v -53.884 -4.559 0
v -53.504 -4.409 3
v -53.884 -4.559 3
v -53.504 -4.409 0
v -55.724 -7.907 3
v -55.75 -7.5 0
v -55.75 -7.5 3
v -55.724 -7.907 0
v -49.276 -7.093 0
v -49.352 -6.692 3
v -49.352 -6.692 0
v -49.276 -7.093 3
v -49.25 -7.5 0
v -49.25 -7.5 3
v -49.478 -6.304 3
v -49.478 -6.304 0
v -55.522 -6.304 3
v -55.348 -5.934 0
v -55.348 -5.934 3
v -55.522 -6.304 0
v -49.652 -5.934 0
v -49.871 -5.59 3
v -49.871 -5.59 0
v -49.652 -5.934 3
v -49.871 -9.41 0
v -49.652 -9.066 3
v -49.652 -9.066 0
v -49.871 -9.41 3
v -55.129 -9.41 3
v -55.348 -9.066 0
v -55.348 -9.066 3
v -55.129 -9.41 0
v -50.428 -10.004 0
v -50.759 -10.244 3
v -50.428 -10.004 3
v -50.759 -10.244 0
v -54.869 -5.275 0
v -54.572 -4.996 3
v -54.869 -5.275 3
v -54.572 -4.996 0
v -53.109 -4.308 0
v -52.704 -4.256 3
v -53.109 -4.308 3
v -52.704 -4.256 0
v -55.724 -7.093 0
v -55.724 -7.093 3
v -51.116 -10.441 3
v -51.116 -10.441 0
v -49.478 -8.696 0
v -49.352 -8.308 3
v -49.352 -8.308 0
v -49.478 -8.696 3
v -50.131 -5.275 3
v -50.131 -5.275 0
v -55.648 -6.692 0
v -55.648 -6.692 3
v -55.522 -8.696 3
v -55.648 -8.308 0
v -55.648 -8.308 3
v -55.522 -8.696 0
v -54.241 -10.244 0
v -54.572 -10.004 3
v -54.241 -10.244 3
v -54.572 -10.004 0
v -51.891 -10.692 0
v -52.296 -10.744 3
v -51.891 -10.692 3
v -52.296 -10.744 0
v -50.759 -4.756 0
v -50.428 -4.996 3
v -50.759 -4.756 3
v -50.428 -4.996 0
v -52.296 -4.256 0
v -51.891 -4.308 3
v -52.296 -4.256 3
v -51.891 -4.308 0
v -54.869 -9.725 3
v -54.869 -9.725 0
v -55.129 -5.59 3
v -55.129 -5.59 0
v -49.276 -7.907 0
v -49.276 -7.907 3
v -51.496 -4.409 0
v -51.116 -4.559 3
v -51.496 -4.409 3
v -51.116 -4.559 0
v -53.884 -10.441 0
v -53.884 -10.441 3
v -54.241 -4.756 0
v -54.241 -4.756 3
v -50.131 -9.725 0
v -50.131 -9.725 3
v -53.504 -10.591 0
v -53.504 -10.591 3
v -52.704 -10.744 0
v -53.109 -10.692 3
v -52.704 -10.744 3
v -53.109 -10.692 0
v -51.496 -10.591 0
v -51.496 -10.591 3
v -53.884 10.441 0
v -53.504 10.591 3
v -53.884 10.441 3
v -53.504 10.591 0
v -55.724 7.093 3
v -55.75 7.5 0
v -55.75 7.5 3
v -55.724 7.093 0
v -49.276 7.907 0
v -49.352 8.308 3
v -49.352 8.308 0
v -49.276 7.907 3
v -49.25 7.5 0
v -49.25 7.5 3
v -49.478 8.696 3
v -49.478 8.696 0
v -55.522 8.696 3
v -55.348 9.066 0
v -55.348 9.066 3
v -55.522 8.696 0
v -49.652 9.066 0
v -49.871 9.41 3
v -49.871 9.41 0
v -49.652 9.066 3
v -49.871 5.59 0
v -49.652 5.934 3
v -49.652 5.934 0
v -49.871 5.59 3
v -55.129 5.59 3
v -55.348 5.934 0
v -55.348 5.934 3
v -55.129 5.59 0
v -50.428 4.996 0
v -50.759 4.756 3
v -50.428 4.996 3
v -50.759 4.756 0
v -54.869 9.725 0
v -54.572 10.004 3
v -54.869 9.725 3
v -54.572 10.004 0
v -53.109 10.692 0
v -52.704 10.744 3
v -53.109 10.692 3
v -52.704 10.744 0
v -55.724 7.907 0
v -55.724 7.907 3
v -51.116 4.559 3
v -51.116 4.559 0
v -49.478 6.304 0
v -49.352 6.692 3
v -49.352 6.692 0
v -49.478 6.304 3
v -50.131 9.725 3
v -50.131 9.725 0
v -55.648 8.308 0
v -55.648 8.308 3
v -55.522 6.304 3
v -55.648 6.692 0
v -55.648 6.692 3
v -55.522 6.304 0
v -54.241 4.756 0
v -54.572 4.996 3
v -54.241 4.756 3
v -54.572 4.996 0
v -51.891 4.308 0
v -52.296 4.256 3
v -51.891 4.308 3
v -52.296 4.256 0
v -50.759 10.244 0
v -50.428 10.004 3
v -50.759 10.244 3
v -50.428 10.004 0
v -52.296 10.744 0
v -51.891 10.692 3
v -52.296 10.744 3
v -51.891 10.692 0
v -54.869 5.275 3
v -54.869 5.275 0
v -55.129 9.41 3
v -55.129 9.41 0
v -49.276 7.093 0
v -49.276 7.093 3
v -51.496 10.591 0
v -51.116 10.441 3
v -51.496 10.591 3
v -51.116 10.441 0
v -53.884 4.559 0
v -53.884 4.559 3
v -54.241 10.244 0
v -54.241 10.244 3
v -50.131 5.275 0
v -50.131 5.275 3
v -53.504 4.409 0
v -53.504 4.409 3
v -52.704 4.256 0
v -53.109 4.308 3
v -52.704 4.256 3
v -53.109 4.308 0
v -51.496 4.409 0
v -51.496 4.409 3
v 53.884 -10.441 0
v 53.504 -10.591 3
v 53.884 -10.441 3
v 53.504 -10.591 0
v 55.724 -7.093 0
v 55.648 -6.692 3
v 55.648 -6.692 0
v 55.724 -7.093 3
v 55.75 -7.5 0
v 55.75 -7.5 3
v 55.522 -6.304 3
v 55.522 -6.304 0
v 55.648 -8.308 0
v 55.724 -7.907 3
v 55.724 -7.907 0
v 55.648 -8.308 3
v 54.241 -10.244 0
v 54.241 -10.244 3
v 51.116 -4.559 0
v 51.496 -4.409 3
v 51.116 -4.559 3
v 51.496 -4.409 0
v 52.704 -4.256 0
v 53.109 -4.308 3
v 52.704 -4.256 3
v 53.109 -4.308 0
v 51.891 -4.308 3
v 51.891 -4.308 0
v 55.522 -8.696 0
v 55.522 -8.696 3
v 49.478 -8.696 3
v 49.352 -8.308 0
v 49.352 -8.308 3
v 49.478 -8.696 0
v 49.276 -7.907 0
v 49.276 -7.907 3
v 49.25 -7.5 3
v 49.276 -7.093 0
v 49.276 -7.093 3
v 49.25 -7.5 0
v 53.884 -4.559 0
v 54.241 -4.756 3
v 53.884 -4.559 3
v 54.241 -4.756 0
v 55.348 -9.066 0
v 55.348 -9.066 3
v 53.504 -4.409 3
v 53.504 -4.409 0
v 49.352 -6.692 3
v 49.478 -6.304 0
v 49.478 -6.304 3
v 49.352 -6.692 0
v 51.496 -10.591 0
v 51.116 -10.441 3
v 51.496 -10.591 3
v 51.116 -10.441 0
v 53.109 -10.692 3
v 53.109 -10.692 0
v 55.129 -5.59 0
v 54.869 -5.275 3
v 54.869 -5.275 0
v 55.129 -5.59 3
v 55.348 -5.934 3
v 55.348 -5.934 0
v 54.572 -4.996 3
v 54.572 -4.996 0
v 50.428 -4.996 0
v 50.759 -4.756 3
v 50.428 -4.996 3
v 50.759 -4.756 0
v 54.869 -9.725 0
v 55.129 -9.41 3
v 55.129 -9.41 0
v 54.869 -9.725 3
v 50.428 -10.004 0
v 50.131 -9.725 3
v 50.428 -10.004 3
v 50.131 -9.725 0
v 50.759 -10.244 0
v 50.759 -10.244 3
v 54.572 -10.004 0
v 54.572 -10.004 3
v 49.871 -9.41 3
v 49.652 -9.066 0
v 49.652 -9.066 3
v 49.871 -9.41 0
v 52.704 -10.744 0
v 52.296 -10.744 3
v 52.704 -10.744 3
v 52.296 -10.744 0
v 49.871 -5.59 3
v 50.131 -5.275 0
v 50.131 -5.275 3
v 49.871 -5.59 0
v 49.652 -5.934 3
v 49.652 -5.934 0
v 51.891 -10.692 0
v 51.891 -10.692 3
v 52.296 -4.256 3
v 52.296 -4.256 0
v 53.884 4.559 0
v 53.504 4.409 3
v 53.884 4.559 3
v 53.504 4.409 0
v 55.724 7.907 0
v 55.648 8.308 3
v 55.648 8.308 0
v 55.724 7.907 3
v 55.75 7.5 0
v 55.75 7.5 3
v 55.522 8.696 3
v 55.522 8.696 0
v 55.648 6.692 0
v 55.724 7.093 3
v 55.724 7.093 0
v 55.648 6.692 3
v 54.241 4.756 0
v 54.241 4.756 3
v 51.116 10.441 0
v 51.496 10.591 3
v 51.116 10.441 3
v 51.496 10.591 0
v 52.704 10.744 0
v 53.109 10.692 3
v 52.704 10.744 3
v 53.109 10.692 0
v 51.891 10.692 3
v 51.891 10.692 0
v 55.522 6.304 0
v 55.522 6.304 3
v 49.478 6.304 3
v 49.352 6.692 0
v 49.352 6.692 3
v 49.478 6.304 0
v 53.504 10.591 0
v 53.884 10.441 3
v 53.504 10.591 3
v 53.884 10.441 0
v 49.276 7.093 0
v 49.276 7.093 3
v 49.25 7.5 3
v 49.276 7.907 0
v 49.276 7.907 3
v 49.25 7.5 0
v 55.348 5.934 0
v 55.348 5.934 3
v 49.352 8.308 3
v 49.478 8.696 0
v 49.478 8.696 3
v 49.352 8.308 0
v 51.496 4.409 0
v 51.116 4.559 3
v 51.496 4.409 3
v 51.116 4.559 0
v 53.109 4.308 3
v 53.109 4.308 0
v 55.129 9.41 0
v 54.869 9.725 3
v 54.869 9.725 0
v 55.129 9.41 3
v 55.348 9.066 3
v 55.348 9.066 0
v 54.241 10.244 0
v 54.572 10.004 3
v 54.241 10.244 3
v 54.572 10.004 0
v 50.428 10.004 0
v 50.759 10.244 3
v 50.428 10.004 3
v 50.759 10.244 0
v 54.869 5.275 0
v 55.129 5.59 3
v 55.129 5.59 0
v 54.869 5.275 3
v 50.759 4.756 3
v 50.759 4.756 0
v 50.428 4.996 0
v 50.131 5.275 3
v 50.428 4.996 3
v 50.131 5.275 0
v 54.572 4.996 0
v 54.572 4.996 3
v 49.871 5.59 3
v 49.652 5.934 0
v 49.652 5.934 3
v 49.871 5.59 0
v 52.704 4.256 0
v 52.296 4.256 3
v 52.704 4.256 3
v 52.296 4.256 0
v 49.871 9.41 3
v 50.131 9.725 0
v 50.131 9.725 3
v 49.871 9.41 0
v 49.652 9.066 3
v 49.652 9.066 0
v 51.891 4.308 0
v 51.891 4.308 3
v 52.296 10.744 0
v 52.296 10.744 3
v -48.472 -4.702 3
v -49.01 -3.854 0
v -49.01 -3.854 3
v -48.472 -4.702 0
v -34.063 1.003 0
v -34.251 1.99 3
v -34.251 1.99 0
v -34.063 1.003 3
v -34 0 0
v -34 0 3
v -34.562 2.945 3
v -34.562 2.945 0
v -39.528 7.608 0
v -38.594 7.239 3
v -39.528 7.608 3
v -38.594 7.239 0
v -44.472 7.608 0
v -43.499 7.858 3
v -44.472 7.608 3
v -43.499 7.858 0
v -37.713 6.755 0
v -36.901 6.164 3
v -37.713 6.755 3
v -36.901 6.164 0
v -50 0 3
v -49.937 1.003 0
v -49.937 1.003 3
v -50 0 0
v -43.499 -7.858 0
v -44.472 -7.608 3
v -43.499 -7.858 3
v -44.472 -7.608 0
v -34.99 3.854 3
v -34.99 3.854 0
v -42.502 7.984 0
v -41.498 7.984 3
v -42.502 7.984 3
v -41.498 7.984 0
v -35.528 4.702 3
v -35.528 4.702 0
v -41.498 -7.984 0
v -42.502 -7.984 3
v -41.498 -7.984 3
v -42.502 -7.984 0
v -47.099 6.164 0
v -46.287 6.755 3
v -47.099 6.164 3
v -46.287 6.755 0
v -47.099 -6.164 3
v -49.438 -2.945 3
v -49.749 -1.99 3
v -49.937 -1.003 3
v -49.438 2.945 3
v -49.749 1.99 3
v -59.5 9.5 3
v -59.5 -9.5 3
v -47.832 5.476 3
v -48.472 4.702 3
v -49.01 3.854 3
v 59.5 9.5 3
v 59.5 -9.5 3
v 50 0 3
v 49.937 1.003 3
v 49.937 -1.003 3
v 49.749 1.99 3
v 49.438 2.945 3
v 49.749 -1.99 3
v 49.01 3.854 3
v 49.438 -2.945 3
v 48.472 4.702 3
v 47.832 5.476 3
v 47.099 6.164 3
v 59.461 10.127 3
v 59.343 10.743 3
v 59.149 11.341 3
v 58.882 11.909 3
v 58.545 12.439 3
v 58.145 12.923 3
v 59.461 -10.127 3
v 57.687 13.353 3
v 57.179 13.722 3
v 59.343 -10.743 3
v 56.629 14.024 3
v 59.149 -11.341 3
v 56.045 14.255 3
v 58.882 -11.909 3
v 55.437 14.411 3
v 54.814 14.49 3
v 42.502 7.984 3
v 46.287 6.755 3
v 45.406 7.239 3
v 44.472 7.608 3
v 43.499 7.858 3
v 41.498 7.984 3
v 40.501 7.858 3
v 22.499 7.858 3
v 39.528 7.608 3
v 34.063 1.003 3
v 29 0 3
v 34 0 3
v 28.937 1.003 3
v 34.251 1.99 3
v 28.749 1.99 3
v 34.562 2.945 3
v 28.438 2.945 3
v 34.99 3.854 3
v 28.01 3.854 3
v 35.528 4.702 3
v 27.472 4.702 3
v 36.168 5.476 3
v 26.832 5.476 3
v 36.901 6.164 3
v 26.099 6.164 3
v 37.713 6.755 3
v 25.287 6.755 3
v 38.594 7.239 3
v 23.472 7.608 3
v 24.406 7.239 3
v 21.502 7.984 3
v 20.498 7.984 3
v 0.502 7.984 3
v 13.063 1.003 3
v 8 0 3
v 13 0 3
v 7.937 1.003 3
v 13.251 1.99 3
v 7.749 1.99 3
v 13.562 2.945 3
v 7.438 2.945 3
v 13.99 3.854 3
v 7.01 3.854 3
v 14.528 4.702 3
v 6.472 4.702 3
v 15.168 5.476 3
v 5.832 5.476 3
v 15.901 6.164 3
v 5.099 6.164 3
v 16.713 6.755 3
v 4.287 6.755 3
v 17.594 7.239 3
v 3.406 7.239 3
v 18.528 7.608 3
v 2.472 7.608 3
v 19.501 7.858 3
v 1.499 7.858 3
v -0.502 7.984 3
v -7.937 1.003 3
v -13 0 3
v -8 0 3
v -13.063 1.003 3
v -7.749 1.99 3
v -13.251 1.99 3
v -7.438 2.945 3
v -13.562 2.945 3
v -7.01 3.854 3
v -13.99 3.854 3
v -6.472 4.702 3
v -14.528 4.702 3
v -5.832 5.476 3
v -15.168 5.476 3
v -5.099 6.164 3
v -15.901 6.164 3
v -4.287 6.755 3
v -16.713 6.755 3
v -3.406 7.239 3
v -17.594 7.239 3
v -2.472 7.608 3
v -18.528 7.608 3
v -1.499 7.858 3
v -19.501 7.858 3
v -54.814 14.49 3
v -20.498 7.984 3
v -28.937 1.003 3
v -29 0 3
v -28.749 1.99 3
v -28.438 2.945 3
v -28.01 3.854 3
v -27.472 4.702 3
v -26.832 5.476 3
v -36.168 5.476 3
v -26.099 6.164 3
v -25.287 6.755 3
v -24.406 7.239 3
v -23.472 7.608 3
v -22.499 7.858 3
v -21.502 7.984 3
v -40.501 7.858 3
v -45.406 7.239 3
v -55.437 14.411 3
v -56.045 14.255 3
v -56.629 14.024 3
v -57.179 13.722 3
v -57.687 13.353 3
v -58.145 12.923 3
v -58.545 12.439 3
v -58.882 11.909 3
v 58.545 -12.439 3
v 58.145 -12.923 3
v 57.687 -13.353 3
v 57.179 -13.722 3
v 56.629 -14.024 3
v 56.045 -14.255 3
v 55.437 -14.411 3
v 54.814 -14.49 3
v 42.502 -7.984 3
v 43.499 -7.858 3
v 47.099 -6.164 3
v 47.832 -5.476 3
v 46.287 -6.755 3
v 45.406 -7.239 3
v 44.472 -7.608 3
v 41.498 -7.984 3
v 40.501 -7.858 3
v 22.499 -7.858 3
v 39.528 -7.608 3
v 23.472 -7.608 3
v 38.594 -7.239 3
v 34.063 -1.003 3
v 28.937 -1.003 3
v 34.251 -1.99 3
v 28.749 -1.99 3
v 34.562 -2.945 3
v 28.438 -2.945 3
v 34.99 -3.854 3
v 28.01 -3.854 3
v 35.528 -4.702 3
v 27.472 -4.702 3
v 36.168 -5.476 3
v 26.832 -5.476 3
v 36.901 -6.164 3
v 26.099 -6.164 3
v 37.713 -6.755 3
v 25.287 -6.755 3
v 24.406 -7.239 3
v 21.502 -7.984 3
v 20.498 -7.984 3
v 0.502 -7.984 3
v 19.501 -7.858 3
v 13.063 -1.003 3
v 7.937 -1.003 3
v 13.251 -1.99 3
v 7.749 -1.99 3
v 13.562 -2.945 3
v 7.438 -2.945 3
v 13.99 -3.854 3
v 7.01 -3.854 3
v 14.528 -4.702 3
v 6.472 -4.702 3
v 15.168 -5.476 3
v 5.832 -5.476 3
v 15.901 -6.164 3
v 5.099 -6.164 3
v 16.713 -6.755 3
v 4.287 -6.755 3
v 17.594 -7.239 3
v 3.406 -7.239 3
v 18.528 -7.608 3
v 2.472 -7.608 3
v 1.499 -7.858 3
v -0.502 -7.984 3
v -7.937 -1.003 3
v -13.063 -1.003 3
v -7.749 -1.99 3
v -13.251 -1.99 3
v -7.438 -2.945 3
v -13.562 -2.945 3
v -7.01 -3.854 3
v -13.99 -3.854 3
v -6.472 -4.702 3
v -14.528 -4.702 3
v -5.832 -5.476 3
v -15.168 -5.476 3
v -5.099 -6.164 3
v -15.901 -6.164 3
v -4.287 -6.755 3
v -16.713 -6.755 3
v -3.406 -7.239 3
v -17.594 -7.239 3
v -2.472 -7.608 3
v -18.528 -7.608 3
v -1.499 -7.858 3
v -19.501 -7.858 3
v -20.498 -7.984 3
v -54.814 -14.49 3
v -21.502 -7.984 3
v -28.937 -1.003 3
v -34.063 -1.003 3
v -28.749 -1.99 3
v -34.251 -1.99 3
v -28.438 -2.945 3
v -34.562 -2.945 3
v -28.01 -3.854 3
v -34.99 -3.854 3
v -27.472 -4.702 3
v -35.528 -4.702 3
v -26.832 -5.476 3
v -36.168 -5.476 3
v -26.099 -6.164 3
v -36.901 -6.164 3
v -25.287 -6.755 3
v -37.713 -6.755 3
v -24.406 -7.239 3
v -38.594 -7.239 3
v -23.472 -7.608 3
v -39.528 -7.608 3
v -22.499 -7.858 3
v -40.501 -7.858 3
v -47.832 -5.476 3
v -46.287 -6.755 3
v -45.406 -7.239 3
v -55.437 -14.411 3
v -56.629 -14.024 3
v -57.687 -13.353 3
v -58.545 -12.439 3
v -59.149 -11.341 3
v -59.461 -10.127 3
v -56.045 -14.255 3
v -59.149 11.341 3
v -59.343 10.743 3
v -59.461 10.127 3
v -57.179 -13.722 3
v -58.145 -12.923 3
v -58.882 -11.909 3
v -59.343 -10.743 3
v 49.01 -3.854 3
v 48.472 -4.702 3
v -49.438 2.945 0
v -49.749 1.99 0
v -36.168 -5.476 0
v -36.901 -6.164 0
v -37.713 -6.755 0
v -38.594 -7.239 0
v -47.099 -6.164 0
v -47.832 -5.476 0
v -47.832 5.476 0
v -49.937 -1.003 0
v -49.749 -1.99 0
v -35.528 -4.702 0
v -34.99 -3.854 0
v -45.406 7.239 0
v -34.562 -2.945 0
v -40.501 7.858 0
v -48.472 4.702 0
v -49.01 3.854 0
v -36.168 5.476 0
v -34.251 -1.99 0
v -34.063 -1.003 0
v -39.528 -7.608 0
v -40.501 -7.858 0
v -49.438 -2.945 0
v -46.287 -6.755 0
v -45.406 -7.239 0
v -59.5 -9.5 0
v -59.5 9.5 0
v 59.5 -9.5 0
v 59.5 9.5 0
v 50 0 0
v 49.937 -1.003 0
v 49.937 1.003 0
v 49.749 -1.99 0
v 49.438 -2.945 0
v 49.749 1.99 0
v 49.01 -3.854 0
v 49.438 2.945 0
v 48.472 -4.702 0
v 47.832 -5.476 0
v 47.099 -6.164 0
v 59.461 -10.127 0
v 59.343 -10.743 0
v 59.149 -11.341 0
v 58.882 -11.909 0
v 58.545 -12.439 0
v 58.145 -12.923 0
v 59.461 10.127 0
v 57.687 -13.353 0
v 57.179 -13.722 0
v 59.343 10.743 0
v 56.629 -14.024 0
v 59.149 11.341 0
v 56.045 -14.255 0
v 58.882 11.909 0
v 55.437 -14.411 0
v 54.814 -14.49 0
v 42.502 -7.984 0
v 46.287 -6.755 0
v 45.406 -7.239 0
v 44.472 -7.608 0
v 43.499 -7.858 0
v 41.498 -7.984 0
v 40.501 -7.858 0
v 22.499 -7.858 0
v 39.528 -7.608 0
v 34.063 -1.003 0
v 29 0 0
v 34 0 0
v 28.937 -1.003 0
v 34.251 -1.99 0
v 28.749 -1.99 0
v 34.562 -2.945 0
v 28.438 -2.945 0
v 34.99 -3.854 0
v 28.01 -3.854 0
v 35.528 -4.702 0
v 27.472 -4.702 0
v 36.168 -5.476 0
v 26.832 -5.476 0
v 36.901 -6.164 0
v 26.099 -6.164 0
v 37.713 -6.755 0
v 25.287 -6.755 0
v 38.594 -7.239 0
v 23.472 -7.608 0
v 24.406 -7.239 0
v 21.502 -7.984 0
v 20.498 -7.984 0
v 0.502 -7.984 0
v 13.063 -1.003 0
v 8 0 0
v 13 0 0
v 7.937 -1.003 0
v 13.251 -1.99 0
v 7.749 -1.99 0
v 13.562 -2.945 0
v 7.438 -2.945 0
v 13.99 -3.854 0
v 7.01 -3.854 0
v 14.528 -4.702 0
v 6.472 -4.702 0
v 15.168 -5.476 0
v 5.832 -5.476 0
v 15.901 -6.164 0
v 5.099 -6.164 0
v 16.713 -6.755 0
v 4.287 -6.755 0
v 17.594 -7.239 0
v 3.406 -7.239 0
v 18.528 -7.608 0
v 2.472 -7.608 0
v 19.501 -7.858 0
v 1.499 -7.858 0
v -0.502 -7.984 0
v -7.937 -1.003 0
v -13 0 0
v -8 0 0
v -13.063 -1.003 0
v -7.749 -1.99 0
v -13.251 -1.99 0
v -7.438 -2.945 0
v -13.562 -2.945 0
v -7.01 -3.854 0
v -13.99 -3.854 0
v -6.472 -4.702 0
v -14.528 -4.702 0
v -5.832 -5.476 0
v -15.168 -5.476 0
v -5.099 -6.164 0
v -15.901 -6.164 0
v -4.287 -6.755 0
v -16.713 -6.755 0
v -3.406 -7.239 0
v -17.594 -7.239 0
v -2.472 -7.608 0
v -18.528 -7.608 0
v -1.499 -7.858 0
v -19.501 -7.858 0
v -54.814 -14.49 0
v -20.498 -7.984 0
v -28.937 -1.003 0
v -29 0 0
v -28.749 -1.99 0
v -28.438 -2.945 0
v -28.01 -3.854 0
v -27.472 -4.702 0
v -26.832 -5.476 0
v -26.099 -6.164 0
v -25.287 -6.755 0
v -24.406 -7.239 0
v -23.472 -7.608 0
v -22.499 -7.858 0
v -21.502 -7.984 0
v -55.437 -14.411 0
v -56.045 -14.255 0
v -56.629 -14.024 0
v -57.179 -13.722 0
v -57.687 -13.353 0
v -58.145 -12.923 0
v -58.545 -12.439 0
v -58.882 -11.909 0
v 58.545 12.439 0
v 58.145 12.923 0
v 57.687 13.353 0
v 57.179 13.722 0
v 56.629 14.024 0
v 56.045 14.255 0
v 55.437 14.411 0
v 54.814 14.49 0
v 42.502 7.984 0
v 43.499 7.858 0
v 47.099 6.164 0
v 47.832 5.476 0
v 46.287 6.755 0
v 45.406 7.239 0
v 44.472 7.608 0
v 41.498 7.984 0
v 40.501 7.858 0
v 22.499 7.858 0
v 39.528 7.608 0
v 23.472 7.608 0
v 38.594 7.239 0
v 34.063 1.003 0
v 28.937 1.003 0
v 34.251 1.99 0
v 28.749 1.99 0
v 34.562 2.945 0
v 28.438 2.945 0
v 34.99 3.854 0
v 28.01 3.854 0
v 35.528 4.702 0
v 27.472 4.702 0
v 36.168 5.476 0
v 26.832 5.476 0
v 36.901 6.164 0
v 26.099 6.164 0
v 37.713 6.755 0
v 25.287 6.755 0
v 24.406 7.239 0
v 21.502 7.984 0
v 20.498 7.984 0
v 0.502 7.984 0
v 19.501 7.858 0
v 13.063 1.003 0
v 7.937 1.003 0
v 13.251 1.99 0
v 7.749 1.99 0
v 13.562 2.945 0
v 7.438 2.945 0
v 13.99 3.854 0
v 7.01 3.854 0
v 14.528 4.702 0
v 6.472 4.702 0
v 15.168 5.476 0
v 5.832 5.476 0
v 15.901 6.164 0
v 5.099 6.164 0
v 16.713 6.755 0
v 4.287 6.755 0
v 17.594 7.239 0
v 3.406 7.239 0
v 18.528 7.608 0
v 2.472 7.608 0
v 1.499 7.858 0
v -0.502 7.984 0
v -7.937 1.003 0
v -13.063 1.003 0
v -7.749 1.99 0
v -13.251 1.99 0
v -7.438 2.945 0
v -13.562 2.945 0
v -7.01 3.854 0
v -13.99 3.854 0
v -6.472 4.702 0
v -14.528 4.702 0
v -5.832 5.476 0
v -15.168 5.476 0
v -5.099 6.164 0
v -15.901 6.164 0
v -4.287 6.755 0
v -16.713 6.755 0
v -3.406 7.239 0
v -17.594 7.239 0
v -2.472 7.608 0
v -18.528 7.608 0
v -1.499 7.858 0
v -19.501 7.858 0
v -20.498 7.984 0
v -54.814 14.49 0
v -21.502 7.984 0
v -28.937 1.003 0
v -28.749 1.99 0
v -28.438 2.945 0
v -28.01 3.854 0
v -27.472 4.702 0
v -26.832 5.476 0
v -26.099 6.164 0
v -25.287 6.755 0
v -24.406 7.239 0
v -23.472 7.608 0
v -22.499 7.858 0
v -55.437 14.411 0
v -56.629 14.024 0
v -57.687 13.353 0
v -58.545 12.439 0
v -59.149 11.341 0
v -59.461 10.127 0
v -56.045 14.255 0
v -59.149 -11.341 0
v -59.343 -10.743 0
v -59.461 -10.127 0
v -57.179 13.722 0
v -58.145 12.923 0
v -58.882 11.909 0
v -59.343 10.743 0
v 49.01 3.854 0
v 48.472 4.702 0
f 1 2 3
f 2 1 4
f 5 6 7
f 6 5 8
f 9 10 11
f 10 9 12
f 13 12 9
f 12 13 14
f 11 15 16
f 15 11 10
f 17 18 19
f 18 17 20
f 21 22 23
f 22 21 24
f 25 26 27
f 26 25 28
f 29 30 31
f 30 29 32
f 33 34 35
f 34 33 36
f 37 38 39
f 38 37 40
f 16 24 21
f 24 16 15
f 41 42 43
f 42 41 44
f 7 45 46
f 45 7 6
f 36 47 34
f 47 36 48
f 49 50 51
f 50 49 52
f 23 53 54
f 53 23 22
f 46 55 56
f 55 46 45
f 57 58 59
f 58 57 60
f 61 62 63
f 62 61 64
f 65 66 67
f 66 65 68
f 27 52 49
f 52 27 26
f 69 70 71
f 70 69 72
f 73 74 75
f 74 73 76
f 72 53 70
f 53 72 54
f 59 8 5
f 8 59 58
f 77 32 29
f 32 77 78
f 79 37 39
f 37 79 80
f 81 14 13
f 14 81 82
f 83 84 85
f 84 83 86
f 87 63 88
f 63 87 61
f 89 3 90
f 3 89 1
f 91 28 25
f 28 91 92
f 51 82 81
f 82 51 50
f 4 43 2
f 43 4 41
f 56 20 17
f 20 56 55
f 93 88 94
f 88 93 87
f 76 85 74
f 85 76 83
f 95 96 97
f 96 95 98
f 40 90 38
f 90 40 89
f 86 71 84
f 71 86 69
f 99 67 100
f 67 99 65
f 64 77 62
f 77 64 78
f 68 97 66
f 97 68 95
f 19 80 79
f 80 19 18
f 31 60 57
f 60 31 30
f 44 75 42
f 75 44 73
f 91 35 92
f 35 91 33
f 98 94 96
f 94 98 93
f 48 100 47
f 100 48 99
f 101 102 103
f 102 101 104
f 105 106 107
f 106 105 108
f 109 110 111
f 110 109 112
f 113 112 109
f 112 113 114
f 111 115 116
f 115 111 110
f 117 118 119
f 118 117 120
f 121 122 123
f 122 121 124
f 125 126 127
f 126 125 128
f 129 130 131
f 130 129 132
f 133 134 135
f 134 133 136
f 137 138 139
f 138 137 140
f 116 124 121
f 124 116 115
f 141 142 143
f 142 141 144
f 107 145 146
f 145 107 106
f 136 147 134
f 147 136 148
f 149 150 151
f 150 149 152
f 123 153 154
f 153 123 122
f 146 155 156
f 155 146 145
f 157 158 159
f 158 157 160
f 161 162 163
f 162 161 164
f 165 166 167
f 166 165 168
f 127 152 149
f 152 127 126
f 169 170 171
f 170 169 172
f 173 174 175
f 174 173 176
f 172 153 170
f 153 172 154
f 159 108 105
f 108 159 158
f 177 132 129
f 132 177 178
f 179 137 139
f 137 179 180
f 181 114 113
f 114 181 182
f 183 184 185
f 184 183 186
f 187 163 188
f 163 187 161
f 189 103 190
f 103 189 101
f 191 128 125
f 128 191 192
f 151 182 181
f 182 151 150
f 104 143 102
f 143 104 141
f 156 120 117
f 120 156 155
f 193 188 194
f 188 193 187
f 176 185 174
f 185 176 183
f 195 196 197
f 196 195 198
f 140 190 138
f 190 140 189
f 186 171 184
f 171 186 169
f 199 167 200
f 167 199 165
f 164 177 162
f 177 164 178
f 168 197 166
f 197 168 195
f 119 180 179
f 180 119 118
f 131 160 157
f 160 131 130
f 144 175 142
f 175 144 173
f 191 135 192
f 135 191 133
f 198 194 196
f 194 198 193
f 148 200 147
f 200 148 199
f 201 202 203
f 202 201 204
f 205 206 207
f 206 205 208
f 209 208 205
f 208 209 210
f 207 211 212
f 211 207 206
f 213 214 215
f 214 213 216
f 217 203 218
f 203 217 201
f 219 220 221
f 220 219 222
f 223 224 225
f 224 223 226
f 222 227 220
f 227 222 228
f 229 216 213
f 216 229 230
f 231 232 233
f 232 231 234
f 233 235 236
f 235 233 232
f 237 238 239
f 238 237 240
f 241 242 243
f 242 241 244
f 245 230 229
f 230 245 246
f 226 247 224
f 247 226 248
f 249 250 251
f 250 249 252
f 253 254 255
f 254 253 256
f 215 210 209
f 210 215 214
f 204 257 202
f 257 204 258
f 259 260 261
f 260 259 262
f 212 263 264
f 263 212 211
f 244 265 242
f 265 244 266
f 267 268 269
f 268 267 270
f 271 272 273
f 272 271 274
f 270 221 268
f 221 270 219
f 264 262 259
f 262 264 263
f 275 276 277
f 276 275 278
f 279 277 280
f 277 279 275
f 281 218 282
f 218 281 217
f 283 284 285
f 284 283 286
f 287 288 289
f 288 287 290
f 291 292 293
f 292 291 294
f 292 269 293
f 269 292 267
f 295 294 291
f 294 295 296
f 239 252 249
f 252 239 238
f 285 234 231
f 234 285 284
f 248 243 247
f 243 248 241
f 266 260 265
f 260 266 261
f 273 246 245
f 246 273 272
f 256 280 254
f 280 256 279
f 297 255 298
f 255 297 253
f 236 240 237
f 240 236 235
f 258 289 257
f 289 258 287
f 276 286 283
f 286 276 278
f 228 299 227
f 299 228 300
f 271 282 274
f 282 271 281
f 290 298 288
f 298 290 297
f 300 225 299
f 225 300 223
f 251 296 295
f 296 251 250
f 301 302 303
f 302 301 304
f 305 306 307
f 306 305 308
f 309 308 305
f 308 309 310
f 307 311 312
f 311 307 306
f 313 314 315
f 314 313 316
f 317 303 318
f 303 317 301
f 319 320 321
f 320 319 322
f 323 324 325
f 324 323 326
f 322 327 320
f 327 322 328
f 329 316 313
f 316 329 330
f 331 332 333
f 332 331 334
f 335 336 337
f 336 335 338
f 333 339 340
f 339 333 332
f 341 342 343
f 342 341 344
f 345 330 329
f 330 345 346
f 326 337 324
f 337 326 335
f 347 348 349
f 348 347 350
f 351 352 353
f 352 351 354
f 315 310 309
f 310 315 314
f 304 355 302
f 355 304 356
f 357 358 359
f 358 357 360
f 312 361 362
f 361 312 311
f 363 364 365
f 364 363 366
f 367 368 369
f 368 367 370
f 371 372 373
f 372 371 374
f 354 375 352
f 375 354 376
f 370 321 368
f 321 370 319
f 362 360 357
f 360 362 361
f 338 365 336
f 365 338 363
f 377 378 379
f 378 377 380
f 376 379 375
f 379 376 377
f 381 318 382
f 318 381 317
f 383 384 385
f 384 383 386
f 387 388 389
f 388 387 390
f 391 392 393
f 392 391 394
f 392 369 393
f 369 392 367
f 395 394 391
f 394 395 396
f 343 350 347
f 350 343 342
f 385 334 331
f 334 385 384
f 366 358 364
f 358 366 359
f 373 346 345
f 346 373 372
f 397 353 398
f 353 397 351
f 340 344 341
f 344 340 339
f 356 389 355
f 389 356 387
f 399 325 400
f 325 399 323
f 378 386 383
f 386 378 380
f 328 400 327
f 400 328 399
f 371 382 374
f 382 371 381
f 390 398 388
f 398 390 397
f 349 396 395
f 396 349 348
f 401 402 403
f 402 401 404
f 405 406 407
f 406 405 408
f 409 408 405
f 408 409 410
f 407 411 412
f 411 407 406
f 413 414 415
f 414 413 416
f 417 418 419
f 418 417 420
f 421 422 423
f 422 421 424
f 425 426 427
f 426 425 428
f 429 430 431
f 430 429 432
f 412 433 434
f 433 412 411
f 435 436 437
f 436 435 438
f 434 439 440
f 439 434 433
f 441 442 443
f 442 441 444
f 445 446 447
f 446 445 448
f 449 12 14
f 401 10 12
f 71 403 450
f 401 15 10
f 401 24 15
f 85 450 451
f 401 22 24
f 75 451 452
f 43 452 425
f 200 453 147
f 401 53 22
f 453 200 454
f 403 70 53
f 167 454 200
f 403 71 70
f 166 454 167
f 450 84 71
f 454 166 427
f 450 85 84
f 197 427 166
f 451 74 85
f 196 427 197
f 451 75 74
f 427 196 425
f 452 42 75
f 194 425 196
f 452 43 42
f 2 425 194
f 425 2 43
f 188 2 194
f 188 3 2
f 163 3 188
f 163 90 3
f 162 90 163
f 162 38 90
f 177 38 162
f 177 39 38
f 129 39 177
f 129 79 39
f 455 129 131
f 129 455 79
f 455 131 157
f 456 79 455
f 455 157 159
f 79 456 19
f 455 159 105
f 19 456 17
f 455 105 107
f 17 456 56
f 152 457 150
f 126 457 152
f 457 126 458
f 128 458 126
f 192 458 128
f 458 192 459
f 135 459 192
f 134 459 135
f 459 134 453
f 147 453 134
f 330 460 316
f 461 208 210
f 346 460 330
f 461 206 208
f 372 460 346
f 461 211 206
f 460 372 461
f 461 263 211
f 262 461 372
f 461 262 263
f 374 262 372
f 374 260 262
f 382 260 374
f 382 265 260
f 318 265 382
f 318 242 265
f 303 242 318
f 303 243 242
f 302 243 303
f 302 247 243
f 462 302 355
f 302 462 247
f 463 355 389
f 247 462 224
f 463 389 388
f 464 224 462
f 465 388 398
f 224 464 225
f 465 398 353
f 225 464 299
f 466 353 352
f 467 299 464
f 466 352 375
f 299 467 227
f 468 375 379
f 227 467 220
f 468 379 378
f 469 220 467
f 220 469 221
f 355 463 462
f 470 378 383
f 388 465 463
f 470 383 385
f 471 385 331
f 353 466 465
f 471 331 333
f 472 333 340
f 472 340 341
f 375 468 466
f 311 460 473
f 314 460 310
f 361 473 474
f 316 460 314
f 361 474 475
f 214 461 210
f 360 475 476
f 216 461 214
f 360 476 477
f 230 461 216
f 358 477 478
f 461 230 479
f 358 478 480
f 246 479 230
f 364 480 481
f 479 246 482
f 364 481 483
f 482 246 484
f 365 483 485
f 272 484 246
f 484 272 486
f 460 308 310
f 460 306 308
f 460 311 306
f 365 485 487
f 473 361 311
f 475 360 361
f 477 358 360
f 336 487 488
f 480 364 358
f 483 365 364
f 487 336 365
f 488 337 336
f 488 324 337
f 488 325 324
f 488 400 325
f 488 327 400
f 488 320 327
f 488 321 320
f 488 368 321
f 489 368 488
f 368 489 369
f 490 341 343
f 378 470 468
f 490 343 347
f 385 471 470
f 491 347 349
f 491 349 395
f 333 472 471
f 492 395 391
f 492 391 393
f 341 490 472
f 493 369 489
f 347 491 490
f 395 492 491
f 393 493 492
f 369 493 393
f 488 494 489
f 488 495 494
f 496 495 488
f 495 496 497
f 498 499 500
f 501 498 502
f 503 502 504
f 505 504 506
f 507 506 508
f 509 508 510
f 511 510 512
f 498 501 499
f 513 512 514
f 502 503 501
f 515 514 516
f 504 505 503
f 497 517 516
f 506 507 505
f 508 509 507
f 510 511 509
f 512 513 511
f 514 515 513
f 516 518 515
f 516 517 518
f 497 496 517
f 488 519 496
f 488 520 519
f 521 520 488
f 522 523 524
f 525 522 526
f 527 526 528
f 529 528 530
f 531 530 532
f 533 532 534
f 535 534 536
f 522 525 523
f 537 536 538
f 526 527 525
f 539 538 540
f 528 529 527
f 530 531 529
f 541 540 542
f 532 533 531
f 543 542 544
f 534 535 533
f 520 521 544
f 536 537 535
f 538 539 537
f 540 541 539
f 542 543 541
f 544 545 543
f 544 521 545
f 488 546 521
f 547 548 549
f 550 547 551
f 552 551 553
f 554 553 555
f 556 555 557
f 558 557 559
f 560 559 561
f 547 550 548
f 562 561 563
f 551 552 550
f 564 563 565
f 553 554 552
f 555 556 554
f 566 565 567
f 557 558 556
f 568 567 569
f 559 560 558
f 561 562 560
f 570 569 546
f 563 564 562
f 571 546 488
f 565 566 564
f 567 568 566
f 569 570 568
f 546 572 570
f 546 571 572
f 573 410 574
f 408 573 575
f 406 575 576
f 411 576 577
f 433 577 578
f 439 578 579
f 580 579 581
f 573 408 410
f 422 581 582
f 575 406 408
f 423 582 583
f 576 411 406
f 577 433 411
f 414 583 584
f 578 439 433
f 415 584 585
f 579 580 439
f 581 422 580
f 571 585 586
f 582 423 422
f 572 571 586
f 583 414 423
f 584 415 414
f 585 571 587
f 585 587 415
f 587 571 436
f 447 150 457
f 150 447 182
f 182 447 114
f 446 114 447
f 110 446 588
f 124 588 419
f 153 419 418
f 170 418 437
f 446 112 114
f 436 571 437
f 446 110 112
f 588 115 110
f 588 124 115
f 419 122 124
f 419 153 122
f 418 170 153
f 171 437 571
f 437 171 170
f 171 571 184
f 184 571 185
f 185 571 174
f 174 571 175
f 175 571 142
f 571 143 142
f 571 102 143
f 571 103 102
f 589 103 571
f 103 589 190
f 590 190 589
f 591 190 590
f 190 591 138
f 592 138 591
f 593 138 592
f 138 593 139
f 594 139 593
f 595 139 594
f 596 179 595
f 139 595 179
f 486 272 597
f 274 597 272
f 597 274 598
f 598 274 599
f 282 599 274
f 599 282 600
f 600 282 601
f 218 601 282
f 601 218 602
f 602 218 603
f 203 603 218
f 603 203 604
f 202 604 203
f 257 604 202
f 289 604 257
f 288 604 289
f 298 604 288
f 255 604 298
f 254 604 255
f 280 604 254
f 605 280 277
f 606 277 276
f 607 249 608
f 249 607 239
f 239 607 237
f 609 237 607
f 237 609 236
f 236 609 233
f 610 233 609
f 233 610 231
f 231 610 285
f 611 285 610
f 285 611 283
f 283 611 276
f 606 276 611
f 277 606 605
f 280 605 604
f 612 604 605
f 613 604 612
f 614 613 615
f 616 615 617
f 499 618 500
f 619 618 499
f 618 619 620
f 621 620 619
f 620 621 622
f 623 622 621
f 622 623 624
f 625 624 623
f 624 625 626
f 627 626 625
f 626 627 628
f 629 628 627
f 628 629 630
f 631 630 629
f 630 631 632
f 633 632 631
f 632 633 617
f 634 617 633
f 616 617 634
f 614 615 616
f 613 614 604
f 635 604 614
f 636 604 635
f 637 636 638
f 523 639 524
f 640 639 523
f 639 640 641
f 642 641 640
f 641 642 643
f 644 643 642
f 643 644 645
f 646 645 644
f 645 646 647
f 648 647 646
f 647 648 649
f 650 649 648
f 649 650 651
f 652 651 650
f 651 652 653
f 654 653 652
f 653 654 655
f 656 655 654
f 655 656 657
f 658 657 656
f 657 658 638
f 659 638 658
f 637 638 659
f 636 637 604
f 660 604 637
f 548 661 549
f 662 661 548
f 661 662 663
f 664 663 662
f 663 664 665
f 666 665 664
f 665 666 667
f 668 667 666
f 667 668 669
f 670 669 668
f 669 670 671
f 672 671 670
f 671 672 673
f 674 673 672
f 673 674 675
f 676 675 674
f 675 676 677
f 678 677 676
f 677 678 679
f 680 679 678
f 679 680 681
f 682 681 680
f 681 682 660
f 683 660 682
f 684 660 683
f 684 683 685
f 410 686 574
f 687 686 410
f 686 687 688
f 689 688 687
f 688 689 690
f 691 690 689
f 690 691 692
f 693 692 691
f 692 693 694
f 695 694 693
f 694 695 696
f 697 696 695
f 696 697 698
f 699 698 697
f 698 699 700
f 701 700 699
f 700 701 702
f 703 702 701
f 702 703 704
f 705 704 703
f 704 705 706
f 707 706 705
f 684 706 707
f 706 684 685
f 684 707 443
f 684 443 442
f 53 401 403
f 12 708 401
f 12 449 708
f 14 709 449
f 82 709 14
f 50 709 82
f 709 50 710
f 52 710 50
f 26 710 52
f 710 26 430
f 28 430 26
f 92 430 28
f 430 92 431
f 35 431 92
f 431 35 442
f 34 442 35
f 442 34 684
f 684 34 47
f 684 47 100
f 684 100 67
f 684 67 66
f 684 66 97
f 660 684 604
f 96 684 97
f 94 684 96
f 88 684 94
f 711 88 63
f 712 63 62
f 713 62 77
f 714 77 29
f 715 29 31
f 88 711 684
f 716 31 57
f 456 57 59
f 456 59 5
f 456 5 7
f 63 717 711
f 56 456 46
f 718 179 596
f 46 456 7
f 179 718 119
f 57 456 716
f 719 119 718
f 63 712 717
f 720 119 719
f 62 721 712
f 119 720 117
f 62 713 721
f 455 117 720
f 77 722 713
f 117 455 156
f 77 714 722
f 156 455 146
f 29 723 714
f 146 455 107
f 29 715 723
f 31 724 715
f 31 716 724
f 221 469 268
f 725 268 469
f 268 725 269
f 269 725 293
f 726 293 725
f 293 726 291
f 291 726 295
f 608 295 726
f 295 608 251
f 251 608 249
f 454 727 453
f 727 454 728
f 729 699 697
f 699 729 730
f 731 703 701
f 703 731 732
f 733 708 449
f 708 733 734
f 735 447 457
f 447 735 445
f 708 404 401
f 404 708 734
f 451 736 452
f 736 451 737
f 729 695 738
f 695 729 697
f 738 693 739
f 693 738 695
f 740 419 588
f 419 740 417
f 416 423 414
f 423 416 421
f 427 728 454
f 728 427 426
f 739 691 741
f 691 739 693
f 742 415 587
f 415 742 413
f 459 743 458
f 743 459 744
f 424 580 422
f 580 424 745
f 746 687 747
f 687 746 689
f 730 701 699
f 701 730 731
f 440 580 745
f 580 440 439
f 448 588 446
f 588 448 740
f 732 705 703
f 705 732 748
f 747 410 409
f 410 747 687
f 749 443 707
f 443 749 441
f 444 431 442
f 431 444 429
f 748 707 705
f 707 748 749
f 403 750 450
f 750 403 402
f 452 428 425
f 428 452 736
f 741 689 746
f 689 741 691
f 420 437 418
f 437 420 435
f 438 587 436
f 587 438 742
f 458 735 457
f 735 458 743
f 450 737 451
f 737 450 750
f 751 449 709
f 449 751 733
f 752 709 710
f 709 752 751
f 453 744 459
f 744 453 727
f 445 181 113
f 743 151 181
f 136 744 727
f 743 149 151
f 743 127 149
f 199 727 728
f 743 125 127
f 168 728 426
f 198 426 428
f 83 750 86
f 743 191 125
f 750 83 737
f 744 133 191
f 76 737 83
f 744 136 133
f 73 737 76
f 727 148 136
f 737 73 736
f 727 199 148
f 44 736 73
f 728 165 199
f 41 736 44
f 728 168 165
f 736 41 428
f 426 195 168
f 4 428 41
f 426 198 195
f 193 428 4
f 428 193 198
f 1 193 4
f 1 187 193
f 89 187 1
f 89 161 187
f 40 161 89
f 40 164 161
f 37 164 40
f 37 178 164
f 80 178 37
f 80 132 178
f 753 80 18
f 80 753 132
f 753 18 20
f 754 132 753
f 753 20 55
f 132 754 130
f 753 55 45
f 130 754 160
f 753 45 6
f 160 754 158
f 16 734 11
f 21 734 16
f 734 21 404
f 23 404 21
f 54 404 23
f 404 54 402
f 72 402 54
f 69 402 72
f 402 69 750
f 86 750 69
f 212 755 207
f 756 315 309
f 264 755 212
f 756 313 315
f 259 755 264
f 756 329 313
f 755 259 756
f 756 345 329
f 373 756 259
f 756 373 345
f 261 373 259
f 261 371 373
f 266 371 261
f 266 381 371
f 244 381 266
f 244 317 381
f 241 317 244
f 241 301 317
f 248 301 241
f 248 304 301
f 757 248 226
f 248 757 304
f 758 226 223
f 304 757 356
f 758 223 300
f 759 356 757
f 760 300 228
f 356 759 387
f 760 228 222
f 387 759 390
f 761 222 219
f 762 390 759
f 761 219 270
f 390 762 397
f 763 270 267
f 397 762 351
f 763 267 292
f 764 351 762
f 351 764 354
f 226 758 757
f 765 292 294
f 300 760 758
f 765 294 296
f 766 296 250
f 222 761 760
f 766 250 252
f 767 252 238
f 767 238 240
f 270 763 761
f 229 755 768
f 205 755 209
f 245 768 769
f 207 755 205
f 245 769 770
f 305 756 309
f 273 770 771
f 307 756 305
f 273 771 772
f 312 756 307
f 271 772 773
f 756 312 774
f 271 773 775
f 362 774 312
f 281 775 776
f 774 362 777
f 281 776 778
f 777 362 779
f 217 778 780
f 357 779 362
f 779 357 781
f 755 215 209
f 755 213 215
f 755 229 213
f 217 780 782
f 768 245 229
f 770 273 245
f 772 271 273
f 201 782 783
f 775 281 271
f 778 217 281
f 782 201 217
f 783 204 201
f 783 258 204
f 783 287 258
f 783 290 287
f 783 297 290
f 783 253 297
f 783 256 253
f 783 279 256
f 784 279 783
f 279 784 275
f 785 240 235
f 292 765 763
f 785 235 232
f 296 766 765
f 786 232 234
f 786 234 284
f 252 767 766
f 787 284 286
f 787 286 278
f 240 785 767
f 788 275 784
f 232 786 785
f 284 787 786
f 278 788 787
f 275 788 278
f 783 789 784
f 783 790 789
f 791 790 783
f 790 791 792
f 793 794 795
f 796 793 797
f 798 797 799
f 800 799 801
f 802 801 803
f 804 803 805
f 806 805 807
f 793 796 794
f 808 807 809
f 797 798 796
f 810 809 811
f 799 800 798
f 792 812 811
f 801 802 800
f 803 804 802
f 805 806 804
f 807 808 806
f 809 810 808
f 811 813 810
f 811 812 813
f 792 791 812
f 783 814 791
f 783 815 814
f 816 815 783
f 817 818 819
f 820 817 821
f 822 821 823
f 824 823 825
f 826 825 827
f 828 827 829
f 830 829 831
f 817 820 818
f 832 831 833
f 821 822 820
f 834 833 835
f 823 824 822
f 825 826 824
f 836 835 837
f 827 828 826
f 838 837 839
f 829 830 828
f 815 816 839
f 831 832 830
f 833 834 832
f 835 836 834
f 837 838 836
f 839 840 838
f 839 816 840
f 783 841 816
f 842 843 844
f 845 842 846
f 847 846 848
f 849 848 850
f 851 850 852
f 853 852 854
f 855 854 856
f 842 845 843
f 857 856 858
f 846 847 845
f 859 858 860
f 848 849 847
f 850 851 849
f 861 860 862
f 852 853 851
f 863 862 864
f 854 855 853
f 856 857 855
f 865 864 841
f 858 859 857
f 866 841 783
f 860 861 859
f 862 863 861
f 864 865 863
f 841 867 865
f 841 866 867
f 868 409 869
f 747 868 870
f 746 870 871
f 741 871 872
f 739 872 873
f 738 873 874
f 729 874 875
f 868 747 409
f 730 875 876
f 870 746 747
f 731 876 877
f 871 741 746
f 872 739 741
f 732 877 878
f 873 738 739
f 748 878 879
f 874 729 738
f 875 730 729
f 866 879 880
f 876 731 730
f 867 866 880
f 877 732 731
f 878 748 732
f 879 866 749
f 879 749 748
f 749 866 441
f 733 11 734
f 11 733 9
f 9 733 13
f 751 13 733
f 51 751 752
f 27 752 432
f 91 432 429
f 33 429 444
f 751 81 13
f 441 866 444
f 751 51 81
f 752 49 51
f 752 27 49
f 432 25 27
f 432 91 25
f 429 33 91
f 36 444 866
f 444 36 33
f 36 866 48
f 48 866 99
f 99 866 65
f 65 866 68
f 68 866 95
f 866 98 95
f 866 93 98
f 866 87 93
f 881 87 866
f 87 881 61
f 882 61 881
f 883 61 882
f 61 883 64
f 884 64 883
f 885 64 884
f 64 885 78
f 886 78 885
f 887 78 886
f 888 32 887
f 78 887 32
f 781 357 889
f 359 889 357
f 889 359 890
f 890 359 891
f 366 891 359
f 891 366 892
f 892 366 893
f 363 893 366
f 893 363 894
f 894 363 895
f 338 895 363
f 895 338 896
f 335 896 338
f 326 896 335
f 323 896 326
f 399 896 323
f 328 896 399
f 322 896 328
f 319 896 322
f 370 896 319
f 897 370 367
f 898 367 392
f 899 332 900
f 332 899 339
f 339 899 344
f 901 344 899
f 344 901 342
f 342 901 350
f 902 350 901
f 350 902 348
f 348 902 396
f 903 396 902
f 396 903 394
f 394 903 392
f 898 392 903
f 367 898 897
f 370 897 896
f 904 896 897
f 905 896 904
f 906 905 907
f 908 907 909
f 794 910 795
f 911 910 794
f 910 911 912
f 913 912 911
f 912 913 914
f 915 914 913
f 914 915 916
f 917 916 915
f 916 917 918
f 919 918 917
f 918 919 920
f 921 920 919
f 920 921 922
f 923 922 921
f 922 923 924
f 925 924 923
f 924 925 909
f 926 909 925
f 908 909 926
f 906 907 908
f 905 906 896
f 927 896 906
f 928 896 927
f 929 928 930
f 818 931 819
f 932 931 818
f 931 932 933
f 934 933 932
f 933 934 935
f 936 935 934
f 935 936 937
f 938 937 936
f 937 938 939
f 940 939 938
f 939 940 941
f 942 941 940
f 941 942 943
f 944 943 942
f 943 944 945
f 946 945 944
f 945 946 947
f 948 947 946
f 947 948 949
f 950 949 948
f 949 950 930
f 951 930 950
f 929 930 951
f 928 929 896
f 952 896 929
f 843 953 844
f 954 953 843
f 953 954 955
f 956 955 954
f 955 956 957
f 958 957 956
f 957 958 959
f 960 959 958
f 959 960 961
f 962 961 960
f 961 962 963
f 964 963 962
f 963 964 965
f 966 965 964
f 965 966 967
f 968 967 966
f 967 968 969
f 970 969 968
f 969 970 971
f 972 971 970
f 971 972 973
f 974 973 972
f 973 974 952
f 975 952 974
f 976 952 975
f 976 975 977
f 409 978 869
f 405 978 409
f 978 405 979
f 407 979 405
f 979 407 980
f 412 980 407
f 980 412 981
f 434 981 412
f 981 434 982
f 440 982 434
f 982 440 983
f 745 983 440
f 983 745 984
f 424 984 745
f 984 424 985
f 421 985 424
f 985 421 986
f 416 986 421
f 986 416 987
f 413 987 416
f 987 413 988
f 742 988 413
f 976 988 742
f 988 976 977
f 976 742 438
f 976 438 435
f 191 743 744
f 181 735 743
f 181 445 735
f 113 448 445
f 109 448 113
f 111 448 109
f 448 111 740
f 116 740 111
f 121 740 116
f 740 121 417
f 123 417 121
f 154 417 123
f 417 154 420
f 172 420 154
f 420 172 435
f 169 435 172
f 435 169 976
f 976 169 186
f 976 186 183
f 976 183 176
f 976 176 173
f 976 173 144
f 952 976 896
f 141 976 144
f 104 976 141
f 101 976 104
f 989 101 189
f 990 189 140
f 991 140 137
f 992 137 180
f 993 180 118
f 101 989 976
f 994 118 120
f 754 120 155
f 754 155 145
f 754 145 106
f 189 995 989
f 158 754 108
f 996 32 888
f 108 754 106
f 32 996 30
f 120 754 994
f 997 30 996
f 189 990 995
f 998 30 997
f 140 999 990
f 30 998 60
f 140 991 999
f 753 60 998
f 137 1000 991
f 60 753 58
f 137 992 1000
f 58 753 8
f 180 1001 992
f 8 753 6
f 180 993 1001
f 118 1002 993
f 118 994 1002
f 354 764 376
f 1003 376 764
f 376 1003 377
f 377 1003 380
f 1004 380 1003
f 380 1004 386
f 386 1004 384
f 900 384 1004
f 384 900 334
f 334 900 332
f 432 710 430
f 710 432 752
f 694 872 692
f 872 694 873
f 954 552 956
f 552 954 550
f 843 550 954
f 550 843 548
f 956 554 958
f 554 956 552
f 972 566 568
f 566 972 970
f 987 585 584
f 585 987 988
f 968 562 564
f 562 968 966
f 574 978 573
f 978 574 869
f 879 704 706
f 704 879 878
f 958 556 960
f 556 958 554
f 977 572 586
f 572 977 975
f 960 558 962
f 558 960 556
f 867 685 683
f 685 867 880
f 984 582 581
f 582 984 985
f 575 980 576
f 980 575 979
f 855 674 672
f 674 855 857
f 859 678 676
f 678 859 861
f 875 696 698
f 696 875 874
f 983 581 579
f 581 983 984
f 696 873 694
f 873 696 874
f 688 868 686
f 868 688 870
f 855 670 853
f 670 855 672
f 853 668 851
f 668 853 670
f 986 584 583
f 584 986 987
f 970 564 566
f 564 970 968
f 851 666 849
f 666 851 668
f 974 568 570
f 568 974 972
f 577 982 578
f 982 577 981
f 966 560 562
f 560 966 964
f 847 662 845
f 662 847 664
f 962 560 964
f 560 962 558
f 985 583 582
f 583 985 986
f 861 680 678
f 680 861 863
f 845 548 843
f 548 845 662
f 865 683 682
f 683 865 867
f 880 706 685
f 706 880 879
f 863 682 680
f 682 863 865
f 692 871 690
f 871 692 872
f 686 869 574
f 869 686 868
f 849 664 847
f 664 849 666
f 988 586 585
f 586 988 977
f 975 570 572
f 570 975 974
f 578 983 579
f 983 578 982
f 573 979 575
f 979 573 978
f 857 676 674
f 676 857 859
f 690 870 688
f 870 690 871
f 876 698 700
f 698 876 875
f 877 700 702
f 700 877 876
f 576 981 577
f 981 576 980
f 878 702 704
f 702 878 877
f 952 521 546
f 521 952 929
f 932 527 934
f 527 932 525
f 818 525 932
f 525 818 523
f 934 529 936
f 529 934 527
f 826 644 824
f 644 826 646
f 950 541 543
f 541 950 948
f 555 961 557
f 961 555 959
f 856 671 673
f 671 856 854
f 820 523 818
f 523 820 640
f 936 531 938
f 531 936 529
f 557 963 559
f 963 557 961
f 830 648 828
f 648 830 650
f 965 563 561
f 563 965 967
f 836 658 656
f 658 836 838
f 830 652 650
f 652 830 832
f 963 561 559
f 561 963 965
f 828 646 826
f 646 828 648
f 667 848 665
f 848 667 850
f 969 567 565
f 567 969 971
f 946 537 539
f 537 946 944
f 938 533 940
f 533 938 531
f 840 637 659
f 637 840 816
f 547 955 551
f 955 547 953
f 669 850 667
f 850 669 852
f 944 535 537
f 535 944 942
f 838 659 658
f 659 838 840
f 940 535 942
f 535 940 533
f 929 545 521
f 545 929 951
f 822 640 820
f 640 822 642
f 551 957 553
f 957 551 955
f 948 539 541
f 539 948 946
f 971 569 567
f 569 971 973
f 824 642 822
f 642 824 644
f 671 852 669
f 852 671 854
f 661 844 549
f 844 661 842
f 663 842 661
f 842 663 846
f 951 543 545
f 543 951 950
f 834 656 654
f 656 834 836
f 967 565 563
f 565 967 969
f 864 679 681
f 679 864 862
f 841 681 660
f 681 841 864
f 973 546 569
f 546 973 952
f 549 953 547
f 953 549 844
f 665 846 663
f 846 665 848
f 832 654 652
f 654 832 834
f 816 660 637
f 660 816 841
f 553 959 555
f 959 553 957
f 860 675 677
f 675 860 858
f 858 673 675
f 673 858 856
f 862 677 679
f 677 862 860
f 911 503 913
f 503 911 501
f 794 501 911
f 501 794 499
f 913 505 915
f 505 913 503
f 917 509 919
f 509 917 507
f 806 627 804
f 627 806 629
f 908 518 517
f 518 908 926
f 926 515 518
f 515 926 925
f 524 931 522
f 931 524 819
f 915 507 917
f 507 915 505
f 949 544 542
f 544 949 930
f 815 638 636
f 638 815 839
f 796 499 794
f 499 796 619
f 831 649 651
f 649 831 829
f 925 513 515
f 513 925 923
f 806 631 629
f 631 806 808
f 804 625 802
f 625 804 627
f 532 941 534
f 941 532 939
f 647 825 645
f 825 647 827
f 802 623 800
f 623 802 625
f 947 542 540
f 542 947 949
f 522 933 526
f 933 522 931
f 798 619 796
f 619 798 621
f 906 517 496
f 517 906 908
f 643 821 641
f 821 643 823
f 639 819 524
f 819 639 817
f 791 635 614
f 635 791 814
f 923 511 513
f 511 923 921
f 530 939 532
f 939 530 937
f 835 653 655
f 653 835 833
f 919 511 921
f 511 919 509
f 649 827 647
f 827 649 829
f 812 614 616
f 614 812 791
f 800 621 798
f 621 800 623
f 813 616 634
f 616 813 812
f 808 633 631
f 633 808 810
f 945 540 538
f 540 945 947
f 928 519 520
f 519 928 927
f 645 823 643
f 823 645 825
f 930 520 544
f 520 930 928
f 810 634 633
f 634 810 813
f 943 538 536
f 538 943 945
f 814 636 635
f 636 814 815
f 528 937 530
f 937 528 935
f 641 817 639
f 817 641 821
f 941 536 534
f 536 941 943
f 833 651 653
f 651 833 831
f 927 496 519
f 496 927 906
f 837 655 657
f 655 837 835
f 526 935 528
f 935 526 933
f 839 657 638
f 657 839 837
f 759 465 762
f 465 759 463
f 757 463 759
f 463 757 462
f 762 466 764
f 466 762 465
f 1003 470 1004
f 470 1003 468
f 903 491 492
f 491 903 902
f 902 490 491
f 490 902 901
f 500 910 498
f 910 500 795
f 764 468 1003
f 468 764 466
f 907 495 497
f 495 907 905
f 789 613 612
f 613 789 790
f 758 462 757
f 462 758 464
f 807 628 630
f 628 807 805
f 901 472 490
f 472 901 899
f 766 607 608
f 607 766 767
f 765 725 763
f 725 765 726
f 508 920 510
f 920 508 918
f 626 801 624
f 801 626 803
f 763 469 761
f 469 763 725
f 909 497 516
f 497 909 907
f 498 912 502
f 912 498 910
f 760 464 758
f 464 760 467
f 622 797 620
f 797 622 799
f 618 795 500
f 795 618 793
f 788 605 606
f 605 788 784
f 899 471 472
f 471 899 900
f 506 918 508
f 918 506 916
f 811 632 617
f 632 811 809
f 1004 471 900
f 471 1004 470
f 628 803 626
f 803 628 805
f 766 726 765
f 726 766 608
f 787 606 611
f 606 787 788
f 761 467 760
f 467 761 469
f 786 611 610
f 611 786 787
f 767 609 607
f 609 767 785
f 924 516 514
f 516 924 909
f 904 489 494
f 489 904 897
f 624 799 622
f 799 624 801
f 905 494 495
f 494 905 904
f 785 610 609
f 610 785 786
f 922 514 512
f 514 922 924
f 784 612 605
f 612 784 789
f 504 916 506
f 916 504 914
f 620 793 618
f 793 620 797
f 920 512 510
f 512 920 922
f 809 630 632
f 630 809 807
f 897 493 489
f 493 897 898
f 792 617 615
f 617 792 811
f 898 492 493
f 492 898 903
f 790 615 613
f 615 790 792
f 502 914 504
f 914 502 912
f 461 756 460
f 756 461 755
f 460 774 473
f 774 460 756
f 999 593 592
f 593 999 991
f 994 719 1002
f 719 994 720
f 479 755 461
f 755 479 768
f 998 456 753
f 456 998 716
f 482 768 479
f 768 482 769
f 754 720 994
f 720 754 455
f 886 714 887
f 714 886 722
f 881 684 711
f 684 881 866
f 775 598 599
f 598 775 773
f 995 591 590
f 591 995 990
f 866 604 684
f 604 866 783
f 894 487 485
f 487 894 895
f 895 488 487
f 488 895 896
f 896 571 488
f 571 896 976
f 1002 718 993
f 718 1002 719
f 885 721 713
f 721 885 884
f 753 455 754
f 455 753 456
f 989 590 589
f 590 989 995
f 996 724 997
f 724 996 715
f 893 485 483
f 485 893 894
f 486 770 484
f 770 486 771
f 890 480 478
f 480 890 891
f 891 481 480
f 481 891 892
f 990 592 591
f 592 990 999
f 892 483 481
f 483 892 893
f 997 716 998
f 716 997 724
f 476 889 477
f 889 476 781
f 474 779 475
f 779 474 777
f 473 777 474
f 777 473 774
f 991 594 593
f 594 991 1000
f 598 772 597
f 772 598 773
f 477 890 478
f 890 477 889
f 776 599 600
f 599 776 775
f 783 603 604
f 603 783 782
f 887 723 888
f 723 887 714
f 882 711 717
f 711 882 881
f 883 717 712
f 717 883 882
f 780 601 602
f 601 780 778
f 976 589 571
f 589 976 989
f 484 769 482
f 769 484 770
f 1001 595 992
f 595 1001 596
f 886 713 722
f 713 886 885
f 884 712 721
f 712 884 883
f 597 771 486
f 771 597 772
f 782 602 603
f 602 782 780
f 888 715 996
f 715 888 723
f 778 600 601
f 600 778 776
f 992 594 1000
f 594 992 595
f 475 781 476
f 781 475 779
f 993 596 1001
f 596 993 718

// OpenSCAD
$fn = 50;


difference() {
	union() {
		hull() {
			translate(v = [-54.5000000000, 9.5000000000, 0]) {
				cylinder(h = 3, r = 5);
			}
			translate(v = [54.5000000000, 9.5000000000, 0]) {
				cylinder(h = 3, r = 5);
			}
			translate(v = [-54.5000000000, -9.5000000000, 0]) {
				cylinder(h = 3, r = 5);
			}
			translate(v = [54.5000000000, -9.5000000000, 0]) {
				cylinder(h = 3, r = 5);
			}
		}
	}
	union() {
		#translate(v = [-52.5000000000, -7.5000000000, -100.0000000000]) {
			cylinder(h = 200, r = 3.2500000000);
		}
		#translate(v = [-52.5000000000, 7.5000000000, -100.0000000000]) {
			cylinder(h = 200, r = 3.2500000000);
		}
		#translate(v = [52.5000000000, -7.5000000000, -100.0000000000]) {
			cylinder(h = 200, r = 3.2500000000);
		}
		#translate(v = [52.5000000000, 7.5000000000, -100.0000000000]) {
			cylinder(h = 200, r = 3.2500000000);
		}
		#translate(v = [-42.0000000000, 0, 0]) {
			cylinder(h = 3, r = 8.0000000000);
		}
		#translate(v = [-21.0000000000, 0, 0]) {
			cylinder(h = 3, r = 8.0000000000);
		}
		#cylinder(h = 3, r = 8.0000000000);
		#translate(v = [21.0000000000, 0, 0]) {
			cylinder(h = 3, r = 8.0000000000);
		}
		#translate(v = [42.0000000000, 0, 0]) {
			cylinder(h = 3, r = 8.0000000000);
		}
	}
}
